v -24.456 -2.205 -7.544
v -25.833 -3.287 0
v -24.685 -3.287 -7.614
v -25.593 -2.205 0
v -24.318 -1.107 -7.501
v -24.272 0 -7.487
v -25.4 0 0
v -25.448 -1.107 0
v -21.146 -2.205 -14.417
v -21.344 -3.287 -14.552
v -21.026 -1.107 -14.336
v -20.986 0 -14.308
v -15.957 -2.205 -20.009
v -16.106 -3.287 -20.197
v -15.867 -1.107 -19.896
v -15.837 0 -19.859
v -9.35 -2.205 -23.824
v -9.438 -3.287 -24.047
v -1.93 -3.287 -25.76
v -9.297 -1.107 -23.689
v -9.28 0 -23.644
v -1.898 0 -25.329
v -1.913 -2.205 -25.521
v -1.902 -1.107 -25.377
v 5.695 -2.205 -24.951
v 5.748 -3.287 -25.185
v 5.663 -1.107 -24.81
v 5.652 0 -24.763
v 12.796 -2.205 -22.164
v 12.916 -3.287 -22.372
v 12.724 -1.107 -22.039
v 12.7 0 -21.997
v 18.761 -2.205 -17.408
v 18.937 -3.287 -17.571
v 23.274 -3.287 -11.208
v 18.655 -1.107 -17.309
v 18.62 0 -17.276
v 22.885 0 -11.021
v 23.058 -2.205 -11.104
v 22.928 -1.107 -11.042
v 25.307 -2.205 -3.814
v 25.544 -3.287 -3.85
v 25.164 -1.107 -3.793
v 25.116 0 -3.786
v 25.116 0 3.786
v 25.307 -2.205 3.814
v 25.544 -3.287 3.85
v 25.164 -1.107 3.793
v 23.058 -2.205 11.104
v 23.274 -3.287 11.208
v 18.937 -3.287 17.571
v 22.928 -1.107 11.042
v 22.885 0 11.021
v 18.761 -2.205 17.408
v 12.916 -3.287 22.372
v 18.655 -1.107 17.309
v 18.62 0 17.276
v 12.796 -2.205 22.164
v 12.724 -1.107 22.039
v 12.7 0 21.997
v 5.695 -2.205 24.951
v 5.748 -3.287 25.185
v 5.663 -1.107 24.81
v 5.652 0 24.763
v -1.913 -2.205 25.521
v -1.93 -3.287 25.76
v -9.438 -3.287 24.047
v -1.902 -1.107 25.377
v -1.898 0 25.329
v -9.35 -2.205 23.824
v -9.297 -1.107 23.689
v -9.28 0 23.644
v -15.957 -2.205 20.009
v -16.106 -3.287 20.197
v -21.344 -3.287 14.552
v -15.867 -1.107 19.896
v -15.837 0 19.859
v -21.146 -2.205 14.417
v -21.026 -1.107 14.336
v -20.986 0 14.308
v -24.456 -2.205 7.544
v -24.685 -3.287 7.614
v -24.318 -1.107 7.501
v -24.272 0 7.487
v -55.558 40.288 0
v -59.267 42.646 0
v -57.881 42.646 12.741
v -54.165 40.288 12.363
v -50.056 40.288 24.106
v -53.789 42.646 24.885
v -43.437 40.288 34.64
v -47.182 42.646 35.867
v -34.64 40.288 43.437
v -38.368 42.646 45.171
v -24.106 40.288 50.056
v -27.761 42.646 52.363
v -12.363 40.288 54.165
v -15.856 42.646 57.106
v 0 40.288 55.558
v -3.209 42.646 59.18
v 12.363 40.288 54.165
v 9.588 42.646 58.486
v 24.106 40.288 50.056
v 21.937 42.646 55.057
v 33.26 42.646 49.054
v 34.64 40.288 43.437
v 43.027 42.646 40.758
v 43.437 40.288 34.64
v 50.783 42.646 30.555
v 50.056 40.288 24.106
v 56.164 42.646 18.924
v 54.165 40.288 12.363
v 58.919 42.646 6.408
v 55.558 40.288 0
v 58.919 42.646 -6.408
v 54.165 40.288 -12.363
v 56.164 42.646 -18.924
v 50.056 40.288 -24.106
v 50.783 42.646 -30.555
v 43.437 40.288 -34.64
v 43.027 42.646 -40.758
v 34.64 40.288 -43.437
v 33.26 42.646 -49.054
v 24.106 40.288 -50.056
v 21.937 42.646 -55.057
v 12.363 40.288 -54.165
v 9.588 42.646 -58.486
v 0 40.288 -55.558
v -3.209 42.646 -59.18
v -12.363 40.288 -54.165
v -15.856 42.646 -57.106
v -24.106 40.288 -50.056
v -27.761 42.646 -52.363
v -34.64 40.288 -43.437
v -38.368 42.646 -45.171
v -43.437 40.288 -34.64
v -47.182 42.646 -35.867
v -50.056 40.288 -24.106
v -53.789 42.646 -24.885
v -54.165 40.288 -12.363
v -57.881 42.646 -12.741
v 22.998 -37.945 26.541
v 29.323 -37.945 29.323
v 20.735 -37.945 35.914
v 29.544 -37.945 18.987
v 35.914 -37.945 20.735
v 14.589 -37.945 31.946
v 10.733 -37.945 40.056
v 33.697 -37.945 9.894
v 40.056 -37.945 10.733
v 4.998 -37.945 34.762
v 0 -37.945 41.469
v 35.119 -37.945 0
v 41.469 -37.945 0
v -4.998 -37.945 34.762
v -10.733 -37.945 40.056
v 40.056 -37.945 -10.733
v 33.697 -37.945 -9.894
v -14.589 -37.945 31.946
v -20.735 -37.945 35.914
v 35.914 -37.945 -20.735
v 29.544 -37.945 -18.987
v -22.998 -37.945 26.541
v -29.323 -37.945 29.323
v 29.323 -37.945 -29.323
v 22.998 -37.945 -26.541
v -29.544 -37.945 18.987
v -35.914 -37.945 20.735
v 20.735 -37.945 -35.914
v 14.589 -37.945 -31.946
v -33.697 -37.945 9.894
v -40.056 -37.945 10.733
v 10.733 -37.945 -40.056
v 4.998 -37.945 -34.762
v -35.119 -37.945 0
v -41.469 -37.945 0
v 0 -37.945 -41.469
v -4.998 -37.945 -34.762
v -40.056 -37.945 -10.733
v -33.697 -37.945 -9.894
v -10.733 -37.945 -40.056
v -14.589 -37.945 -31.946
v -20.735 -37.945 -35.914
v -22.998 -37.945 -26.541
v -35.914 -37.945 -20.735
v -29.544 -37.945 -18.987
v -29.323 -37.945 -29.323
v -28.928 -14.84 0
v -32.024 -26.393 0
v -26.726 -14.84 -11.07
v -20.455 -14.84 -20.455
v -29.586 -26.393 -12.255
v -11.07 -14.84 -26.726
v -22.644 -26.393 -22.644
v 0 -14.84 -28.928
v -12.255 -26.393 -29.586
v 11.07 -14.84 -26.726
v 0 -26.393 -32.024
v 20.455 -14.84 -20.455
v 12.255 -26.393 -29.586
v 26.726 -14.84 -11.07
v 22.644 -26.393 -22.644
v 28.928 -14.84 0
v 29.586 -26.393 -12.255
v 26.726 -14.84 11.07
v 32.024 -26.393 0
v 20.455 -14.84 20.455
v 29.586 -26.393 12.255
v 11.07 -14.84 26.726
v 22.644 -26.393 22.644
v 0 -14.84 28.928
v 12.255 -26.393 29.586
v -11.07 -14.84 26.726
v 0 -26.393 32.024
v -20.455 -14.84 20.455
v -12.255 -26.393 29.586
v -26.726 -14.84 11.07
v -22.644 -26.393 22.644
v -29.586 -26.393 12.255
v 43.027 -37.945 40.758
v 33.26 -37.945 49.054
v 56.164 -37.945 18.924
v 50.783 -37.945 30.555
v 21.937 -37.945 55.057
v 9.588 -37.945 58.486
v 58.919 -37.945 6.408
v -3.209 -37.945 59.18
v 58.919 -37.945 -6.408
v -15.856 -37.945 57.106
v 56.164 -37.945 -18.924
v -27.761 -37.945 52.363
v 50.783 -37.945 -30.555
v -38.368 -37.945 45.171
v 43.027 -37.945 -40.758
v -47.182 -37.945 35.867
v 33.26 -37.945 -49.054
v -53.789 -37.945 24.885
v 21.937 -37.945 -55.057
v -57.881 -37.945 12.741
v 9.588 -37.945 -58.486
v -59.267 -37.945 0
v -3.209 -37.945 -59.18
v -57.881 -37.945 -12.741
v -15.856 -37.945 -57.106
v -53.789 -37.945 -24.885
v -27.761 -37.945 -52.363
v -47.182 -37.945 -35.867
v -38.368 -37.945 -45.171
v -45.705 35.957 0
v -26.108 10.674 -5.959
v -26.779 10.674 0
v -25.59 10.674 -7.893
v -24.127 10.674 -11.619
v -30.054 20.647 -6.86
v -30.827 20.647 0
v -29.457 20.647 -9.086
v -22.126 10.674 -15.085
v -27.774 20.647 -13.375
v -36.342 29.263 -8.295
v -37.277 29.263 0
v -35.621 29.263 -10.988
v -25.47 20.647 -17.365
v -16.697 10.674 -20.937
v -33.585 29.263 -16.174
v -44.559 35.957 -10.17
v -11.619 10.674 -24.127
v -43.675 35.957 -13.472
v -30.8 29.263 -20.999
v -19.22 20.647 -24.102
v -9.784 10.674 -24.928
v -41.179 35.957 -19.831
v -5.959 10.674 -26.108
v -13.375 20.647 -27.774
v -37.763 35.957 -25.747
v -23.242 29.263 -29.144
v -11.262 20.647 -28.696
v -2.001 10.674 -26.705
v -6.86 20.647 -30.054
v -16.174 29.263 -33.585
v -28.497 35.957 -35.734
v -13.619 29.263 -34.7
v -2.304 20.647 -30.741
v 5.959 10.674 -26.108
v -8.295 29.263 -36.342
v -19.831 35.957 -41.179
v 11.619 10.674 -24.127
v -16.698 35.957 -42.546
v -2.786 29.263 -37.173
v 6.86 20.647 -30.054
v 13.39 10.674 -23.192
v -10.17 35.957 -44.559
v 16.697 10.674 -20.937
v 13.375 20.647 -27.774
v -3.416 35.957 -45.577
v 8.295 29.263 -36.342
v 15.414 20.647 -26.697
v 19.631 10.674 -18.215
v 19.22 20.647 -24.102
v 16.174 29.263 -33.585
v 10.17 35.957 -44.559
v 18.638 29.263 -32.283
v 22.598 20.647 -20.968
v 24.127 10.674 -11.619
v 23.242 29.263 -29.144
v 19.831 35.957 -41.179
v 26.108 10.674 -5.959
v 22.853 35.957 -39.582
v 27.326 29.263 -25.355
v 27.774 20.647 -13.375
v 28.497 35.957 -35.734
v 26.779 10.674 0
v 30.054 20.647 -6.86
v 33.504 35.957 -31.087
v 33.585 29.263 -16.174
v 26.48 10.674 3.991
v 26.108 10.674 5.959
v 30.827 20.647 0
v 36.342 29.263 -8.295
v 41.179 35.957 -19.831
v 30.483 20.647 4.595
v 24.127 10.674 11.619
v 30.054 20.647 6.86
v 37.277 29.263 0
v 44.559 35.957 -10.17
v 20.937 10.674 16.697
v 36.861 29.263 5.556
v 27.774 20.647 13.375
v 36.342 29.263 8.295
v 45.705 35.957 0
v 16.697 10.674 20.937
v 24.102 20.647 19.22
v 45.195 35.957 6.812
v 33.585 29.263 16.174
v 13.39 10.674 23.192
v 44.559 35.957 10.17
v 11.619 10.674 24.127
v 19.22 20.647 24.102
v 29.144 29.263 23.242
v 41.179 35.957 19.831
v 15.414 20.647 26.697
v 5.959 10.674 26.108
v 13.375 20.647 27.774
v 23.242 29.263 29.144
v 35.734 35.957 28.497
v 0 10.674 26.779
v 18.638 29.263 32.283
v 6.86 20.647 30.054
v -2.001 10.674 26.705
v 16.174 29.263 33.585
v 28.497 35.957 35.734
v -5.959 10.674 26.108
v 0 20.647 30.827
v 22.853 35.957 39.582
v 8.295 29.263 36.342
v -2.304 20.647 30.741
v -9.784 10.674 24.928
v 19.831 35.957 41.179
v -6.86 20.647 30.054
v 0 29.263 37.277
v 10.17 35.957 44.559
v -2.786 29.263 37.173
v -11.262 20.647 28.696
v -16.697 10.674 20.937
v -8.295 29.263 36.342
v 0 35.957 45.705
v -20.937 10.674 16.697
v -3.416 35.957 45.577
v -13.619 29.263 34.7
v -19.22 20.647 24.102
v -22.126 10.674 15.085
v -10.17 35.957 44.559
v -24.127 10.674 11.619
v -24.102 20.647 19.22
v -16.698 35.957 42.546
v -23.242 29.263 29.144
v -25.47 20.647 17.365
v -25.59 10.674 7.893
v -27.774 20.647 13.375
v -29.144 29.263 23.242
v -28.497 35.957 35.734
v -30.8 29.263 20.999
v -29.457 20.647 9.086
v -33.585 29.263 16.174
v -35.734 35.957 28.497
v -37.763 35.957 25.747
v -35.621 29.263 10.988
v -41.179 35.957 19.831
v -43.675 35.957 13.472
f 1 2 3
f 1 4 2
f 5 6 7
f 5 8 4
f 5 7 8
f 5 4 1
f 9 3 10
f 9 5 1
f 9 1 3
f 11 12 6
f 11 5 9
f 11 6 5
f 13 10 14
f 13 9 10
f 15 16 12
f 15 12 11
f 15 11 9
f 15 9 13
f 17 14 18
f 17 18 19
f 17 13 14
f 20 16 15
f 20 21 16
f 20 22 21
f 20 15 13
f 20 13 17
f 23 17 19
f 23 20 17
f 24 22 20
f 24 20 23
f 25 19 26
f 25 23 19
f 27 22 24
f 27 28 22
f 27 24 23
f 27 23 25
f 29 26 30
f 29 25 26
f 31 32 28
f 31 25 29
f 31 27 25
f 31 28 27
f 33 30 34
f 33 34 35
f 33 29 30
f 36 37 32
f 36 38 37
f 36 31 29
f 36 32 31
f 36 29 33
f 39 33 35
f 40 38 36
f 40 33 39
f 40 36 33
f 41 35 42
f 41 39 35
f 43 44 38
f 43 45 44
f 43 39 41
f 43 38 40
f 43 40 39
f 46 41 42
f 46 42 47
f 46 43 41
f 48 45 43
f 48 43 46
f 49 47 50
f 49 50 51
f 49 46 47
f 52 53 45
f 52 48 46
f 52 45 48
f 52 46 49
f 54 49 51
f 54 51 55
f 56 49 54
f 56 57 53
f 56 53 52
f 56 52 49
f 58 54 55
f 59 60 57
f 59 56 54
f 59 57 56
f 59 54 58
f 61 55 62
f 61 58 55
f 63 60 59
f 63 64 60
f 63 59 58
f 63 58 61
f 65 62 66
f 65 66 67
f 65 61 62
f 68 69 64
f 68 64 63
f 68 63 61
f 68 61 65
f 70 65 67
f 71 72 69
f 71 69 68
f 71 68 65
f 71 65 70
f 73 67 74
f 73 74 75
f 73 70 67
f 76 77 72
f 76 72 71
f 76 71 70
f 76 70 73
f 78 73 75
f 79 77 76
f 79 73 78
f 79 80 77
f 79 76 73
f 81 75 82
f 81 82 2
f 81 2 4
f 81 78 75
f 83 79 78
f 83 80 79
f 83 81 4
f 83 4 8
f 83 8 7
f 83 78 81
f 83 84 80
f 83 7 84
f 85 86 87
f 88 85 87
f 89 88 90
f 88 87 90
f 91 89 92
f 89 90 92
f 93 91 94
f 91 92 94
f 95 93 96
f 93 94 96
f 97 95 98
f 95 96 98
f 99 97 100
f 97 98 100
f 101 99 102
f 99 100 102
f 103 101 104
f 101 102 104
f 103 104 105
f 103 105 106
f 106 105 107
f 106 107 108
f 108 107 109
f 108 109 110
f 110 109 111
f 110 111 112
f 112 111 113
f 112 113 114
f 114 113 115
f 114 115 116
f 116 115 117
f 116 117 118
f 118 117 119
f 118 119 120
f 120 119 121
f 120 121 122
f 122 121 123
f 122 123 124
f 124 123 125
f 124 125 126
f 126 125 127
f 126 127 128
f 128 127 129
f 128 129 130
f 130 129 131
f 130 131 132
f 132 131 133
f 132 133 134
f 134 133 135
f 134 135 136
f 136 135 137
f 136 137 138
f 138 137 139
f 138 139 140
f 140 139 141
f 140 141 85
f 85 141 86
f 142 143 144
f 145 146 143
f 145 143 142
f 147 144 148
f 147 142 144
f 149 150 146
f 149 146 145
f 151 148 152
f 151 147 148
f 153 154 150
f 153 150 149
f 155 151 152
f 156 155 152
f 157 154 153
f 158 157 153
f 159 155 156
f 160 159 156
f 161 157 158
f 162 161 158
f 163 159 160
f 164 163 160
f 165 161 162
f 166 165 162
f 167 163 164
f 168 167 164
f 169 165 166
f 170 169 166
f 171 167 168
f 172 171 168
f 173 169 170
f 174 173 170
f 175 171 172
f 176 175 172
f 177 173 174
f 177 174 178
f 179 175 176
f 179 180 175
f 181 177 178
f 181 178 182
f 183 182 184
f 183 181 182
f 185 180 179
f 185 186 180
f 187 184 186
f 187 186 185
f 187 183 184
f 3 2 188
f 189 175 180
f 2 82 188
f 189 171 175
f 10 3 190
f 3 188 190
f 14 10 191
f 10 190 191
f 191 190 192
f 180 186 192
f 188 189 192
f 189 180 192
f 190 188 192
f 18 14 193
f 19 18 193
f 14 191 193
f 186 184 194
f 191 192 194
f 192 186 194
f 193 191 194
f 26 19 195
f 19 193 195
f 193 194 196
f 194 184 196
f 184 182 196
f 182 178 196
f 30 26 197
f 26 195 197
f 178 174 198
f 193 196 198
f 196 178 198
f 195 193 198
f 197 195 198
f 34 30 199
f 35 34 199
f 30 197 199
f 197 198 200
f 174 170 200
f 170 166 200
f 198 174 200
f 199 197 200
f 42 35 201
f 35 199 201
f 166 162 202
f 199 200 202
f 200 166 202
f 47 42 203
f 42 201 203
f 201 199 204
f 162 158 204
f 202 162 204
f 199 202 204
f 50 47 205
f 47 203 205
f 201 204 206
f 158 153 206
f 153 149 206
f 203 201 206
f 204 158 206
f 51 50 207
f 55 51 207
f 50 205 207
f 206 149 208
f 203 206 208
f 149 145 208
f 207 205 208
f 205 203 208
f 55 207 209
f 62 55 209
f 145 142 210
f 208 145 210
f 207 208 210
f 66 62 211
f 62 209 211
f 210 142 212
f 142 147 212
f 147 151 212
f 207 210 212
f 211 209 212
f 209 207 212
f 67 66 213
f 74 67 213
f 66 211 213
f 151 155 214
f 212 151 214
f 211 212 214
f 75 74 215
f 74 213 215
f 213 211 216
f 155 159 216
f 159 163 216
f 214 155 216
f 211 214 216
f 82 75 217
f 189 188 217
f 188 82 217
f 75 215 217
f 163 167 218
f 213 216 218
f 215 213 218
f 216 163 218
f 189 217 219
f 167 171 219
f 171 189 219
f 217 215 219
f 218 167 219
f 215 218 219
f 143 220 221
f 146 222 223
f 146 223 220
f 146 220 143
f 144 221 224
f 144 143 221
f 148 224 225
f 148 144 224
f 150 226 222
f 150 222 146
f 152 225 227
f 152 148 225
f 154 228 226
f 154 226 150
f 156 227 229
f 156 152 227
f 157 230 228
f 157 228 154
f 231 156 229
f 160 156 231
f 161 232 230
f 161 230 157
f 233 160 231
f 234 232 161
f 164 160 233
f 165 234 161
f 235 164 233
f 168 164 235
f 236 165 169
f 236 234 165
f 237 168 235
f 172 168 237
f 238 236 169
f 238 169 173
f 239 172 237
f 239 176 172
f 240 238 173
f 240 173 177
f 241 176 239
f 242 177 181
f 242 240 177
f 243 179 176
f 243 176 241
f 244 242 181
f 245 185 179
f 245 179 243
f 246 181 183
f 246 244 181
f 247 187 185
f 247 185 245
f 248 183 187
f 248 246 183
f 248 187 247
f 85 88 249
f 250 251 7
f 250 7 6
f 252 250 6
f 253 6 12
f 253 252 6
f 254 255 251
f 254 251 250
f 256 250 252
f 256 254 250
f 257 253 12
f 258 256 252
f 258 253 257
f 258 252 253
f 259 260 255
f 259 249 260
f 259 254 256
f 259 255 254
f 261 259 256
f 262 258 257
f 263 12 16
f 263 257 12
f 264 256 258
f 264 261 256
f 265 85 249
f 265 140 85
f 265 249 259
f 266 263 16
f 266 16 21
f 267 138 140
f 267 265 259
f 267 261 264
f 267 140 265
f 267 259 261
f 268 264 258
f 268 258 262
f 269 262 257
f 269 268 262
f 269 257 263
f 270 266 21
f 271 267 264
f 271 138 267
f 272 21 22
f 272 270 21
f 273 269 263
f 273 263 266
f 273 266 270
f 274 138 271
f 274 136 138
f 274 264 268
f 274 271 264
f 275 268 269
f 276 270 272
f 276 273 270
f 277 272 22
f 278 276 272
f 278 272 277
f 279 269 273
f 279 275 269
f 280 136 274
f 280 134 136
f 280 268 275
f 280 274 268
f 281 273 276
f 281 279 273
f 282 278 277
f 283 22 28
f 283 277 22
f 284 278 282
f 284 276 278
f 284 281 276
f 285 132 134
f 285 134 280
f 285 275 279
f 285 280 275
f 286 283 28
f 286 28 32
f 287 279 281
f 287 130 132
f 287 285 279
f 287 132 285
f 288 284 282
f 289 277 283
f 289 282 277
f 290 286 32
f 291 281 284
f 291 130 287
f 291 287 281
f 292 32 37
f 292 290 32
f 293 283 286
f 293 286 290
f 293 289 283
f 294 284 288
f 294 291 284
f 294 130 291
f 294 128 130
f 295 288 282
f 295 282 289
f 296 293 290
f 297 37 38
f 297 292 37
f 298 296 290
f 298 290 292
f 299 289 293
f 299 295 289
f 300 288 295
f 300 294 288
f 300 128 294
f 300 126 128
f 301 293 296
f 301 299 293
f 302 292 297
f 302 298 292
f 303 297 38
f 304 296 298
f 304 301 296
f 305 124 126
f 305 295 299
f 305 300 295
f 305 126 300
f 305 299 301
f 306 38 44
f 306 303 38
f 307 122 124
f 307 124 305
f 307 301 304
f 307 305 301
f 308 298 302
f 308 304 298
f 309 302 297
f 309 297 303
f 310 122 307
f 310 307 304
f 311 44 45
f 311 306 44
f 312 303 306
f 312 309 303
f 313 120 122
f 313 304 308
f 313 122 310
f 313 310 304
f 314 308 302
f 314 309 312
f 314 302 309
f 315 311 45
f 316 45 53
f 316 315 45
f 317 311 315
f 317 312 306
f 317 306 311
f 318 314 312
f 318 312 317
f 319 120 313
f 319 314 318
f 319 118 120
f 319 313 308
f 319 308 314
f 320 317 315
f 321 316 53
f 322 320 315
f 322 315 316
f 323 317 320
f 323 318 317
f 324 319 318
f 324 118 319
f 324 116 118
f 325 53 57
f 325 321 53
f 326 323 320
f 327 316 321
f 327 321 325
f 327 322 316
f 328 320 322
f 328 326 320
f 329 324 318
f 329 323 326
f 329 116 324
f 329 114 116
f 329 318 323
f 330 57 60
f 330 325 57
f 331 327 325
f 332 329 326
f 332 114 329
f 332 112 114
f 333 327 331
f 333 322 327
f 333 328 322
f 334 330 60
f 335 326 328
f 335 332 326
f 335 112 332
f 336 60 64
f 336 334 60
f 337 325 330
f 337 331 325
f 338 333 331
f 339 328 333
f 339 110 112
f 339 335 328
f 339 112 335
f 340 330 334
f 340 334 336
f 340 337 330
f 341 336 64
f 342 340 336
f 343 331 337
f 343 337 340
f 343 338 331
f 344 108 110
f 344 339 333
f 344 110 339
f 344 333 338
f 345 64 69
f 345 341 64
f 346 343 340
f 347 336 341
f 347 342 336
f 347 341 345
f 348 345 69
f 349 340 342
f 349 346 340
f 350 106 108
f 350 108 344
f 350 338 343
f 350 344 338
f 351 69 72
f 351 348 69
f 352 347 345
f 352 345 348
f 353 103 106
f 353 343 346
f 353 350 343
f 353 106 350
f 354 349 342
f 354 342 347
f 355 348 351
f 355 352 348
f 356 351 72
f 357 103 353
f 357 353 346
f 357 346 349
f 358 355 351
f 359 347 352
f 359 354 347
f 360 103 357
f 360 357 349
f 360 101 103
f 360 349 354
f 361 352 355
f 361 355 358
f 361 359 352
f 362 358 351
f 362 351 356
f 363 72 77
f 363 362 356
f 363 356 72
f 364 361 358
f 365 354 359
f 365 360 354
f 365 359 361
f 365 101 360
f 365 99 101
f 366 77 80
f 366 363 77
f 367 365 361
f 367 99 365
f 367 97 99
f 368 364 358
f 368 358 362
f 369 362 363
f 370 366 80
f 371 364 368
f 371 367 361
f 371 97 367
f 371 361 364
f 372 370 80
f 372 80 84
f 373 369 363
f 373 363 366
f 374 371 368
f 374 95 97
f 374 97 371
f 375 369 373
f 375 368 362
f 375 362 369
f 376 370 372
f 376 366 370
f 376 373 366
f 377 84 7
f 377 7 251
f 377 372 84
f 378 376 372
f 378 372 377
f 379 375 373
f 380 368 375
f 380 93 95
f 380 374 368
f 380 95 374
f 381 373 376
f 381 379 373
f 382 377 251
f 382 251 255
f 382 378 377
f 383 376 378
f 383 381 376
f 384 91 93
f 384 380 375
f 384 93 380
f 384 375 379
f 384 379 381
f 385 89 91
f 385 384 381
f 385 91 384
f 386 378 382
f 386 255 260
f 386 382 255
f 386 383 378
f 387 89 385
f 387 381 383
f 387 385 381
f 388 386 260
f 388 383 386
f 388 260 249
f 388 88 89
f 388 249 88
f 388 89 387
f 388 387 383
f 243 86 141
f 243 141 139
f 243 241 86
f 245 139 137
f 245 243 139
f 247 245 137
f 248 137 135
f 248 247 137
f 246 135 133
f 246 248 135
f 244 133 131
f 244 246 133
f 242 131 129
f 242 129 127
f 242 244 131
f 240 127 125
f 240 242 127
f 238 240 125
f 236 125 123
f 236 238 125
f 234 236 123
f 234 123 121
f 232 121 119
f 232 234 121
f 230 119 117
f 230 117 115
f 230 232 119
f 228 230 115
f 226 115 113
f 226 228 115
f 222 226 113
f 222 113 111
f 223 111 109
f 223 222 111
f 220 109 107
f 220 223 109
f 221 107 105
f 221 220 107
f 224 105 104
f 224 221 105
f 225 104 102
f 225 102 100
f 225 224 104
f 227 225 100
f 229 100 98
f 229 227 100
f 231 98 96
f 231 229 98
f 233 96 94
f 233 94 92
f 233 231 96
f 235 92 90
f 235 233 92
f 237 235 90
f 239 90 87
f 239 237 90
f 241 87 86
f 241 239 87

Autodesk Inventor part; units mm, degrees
ref_plane "YZ Plane" through (0, 0, 0) normal (1, 0, 0) x (0, 1, 0)
ref_plane "XZ Plane" through (0, 0, 0) normal (0, 1, 0) x (-1, 0, 0)
ref_plane "XY Plane" through (0, 0, 0) normal (0, 0, 1) x (1, 0, 0)
sketch "Sketch1" plane through (0, 0, 0) normal (0, 0, 1) x (1, 0, 0)
  arc A0 (-25.8327, -3.287) -> (-25.4, 0) centre (-38.1, 0) ccw
  line L0 (-59.2667, 42.6459) -> (-60.6149, 42.6459)
  line L1 (-59.2667, 42.6459) -> (0, 42.6459) construction
  line L2 (-41.4694, -37.9453) -> (-35.1194, -37.9453)
  line L3 (-80.7, -43.0791) -> (-21.9625, -43.0791) construction
  line L4 (-87.05, -219.9038) -> (-83.875, -219.9038)
  line L5 (0, 42.6459) -> (0, 0)
  line L6 (-87.8501, 55.3459) -> (-18.3062, 55.3459) construction
  line L7 (-87.8501, 55.3459) -> (-14.7047, 55.3459) construction
  line L8 (-87.8501, 55.3459) -> (-52.22, 55.3459) construction
  arc A1 (-25.4, 0) -> (-55.5582, 40.2879) centre (-67.3891, 0) ccw
  line L9 (-59.2667, 42.6459) -> (-59.2667, -37.9453)
  line L10 (-59.2667, 42.6459) -> (21.3245, 42.6459) construction
  line L11 (-59.2667, -37.9453) -> (-41.4694, -37.9453)
  line L12 (-55.5582, 40.2879) -> (-59.2667, 42.6459)
  line L13 (-35.1194, -37.9453) -> (-25.8327, -3.287)
  dimension "d56" = 25.4
  dimension "d60" = 12.7
  dimension "d61" = 12.7
  dimension "d62" = 59.2667
  dimension "d63" = 6.35
  dimension "d77" = 3.175
  dimension "d84" = 41.9891
  dimension "d85" = 32.2919
  dimension "d86" = 90
  dimension "d87" = 80.5912
revolve "Revolution1" add sketch "Sketch1" angle 360 about axis through (0, 42.6459, 0) along (0, -1, 0)
properties part number "Graphite" material "GFRC"
